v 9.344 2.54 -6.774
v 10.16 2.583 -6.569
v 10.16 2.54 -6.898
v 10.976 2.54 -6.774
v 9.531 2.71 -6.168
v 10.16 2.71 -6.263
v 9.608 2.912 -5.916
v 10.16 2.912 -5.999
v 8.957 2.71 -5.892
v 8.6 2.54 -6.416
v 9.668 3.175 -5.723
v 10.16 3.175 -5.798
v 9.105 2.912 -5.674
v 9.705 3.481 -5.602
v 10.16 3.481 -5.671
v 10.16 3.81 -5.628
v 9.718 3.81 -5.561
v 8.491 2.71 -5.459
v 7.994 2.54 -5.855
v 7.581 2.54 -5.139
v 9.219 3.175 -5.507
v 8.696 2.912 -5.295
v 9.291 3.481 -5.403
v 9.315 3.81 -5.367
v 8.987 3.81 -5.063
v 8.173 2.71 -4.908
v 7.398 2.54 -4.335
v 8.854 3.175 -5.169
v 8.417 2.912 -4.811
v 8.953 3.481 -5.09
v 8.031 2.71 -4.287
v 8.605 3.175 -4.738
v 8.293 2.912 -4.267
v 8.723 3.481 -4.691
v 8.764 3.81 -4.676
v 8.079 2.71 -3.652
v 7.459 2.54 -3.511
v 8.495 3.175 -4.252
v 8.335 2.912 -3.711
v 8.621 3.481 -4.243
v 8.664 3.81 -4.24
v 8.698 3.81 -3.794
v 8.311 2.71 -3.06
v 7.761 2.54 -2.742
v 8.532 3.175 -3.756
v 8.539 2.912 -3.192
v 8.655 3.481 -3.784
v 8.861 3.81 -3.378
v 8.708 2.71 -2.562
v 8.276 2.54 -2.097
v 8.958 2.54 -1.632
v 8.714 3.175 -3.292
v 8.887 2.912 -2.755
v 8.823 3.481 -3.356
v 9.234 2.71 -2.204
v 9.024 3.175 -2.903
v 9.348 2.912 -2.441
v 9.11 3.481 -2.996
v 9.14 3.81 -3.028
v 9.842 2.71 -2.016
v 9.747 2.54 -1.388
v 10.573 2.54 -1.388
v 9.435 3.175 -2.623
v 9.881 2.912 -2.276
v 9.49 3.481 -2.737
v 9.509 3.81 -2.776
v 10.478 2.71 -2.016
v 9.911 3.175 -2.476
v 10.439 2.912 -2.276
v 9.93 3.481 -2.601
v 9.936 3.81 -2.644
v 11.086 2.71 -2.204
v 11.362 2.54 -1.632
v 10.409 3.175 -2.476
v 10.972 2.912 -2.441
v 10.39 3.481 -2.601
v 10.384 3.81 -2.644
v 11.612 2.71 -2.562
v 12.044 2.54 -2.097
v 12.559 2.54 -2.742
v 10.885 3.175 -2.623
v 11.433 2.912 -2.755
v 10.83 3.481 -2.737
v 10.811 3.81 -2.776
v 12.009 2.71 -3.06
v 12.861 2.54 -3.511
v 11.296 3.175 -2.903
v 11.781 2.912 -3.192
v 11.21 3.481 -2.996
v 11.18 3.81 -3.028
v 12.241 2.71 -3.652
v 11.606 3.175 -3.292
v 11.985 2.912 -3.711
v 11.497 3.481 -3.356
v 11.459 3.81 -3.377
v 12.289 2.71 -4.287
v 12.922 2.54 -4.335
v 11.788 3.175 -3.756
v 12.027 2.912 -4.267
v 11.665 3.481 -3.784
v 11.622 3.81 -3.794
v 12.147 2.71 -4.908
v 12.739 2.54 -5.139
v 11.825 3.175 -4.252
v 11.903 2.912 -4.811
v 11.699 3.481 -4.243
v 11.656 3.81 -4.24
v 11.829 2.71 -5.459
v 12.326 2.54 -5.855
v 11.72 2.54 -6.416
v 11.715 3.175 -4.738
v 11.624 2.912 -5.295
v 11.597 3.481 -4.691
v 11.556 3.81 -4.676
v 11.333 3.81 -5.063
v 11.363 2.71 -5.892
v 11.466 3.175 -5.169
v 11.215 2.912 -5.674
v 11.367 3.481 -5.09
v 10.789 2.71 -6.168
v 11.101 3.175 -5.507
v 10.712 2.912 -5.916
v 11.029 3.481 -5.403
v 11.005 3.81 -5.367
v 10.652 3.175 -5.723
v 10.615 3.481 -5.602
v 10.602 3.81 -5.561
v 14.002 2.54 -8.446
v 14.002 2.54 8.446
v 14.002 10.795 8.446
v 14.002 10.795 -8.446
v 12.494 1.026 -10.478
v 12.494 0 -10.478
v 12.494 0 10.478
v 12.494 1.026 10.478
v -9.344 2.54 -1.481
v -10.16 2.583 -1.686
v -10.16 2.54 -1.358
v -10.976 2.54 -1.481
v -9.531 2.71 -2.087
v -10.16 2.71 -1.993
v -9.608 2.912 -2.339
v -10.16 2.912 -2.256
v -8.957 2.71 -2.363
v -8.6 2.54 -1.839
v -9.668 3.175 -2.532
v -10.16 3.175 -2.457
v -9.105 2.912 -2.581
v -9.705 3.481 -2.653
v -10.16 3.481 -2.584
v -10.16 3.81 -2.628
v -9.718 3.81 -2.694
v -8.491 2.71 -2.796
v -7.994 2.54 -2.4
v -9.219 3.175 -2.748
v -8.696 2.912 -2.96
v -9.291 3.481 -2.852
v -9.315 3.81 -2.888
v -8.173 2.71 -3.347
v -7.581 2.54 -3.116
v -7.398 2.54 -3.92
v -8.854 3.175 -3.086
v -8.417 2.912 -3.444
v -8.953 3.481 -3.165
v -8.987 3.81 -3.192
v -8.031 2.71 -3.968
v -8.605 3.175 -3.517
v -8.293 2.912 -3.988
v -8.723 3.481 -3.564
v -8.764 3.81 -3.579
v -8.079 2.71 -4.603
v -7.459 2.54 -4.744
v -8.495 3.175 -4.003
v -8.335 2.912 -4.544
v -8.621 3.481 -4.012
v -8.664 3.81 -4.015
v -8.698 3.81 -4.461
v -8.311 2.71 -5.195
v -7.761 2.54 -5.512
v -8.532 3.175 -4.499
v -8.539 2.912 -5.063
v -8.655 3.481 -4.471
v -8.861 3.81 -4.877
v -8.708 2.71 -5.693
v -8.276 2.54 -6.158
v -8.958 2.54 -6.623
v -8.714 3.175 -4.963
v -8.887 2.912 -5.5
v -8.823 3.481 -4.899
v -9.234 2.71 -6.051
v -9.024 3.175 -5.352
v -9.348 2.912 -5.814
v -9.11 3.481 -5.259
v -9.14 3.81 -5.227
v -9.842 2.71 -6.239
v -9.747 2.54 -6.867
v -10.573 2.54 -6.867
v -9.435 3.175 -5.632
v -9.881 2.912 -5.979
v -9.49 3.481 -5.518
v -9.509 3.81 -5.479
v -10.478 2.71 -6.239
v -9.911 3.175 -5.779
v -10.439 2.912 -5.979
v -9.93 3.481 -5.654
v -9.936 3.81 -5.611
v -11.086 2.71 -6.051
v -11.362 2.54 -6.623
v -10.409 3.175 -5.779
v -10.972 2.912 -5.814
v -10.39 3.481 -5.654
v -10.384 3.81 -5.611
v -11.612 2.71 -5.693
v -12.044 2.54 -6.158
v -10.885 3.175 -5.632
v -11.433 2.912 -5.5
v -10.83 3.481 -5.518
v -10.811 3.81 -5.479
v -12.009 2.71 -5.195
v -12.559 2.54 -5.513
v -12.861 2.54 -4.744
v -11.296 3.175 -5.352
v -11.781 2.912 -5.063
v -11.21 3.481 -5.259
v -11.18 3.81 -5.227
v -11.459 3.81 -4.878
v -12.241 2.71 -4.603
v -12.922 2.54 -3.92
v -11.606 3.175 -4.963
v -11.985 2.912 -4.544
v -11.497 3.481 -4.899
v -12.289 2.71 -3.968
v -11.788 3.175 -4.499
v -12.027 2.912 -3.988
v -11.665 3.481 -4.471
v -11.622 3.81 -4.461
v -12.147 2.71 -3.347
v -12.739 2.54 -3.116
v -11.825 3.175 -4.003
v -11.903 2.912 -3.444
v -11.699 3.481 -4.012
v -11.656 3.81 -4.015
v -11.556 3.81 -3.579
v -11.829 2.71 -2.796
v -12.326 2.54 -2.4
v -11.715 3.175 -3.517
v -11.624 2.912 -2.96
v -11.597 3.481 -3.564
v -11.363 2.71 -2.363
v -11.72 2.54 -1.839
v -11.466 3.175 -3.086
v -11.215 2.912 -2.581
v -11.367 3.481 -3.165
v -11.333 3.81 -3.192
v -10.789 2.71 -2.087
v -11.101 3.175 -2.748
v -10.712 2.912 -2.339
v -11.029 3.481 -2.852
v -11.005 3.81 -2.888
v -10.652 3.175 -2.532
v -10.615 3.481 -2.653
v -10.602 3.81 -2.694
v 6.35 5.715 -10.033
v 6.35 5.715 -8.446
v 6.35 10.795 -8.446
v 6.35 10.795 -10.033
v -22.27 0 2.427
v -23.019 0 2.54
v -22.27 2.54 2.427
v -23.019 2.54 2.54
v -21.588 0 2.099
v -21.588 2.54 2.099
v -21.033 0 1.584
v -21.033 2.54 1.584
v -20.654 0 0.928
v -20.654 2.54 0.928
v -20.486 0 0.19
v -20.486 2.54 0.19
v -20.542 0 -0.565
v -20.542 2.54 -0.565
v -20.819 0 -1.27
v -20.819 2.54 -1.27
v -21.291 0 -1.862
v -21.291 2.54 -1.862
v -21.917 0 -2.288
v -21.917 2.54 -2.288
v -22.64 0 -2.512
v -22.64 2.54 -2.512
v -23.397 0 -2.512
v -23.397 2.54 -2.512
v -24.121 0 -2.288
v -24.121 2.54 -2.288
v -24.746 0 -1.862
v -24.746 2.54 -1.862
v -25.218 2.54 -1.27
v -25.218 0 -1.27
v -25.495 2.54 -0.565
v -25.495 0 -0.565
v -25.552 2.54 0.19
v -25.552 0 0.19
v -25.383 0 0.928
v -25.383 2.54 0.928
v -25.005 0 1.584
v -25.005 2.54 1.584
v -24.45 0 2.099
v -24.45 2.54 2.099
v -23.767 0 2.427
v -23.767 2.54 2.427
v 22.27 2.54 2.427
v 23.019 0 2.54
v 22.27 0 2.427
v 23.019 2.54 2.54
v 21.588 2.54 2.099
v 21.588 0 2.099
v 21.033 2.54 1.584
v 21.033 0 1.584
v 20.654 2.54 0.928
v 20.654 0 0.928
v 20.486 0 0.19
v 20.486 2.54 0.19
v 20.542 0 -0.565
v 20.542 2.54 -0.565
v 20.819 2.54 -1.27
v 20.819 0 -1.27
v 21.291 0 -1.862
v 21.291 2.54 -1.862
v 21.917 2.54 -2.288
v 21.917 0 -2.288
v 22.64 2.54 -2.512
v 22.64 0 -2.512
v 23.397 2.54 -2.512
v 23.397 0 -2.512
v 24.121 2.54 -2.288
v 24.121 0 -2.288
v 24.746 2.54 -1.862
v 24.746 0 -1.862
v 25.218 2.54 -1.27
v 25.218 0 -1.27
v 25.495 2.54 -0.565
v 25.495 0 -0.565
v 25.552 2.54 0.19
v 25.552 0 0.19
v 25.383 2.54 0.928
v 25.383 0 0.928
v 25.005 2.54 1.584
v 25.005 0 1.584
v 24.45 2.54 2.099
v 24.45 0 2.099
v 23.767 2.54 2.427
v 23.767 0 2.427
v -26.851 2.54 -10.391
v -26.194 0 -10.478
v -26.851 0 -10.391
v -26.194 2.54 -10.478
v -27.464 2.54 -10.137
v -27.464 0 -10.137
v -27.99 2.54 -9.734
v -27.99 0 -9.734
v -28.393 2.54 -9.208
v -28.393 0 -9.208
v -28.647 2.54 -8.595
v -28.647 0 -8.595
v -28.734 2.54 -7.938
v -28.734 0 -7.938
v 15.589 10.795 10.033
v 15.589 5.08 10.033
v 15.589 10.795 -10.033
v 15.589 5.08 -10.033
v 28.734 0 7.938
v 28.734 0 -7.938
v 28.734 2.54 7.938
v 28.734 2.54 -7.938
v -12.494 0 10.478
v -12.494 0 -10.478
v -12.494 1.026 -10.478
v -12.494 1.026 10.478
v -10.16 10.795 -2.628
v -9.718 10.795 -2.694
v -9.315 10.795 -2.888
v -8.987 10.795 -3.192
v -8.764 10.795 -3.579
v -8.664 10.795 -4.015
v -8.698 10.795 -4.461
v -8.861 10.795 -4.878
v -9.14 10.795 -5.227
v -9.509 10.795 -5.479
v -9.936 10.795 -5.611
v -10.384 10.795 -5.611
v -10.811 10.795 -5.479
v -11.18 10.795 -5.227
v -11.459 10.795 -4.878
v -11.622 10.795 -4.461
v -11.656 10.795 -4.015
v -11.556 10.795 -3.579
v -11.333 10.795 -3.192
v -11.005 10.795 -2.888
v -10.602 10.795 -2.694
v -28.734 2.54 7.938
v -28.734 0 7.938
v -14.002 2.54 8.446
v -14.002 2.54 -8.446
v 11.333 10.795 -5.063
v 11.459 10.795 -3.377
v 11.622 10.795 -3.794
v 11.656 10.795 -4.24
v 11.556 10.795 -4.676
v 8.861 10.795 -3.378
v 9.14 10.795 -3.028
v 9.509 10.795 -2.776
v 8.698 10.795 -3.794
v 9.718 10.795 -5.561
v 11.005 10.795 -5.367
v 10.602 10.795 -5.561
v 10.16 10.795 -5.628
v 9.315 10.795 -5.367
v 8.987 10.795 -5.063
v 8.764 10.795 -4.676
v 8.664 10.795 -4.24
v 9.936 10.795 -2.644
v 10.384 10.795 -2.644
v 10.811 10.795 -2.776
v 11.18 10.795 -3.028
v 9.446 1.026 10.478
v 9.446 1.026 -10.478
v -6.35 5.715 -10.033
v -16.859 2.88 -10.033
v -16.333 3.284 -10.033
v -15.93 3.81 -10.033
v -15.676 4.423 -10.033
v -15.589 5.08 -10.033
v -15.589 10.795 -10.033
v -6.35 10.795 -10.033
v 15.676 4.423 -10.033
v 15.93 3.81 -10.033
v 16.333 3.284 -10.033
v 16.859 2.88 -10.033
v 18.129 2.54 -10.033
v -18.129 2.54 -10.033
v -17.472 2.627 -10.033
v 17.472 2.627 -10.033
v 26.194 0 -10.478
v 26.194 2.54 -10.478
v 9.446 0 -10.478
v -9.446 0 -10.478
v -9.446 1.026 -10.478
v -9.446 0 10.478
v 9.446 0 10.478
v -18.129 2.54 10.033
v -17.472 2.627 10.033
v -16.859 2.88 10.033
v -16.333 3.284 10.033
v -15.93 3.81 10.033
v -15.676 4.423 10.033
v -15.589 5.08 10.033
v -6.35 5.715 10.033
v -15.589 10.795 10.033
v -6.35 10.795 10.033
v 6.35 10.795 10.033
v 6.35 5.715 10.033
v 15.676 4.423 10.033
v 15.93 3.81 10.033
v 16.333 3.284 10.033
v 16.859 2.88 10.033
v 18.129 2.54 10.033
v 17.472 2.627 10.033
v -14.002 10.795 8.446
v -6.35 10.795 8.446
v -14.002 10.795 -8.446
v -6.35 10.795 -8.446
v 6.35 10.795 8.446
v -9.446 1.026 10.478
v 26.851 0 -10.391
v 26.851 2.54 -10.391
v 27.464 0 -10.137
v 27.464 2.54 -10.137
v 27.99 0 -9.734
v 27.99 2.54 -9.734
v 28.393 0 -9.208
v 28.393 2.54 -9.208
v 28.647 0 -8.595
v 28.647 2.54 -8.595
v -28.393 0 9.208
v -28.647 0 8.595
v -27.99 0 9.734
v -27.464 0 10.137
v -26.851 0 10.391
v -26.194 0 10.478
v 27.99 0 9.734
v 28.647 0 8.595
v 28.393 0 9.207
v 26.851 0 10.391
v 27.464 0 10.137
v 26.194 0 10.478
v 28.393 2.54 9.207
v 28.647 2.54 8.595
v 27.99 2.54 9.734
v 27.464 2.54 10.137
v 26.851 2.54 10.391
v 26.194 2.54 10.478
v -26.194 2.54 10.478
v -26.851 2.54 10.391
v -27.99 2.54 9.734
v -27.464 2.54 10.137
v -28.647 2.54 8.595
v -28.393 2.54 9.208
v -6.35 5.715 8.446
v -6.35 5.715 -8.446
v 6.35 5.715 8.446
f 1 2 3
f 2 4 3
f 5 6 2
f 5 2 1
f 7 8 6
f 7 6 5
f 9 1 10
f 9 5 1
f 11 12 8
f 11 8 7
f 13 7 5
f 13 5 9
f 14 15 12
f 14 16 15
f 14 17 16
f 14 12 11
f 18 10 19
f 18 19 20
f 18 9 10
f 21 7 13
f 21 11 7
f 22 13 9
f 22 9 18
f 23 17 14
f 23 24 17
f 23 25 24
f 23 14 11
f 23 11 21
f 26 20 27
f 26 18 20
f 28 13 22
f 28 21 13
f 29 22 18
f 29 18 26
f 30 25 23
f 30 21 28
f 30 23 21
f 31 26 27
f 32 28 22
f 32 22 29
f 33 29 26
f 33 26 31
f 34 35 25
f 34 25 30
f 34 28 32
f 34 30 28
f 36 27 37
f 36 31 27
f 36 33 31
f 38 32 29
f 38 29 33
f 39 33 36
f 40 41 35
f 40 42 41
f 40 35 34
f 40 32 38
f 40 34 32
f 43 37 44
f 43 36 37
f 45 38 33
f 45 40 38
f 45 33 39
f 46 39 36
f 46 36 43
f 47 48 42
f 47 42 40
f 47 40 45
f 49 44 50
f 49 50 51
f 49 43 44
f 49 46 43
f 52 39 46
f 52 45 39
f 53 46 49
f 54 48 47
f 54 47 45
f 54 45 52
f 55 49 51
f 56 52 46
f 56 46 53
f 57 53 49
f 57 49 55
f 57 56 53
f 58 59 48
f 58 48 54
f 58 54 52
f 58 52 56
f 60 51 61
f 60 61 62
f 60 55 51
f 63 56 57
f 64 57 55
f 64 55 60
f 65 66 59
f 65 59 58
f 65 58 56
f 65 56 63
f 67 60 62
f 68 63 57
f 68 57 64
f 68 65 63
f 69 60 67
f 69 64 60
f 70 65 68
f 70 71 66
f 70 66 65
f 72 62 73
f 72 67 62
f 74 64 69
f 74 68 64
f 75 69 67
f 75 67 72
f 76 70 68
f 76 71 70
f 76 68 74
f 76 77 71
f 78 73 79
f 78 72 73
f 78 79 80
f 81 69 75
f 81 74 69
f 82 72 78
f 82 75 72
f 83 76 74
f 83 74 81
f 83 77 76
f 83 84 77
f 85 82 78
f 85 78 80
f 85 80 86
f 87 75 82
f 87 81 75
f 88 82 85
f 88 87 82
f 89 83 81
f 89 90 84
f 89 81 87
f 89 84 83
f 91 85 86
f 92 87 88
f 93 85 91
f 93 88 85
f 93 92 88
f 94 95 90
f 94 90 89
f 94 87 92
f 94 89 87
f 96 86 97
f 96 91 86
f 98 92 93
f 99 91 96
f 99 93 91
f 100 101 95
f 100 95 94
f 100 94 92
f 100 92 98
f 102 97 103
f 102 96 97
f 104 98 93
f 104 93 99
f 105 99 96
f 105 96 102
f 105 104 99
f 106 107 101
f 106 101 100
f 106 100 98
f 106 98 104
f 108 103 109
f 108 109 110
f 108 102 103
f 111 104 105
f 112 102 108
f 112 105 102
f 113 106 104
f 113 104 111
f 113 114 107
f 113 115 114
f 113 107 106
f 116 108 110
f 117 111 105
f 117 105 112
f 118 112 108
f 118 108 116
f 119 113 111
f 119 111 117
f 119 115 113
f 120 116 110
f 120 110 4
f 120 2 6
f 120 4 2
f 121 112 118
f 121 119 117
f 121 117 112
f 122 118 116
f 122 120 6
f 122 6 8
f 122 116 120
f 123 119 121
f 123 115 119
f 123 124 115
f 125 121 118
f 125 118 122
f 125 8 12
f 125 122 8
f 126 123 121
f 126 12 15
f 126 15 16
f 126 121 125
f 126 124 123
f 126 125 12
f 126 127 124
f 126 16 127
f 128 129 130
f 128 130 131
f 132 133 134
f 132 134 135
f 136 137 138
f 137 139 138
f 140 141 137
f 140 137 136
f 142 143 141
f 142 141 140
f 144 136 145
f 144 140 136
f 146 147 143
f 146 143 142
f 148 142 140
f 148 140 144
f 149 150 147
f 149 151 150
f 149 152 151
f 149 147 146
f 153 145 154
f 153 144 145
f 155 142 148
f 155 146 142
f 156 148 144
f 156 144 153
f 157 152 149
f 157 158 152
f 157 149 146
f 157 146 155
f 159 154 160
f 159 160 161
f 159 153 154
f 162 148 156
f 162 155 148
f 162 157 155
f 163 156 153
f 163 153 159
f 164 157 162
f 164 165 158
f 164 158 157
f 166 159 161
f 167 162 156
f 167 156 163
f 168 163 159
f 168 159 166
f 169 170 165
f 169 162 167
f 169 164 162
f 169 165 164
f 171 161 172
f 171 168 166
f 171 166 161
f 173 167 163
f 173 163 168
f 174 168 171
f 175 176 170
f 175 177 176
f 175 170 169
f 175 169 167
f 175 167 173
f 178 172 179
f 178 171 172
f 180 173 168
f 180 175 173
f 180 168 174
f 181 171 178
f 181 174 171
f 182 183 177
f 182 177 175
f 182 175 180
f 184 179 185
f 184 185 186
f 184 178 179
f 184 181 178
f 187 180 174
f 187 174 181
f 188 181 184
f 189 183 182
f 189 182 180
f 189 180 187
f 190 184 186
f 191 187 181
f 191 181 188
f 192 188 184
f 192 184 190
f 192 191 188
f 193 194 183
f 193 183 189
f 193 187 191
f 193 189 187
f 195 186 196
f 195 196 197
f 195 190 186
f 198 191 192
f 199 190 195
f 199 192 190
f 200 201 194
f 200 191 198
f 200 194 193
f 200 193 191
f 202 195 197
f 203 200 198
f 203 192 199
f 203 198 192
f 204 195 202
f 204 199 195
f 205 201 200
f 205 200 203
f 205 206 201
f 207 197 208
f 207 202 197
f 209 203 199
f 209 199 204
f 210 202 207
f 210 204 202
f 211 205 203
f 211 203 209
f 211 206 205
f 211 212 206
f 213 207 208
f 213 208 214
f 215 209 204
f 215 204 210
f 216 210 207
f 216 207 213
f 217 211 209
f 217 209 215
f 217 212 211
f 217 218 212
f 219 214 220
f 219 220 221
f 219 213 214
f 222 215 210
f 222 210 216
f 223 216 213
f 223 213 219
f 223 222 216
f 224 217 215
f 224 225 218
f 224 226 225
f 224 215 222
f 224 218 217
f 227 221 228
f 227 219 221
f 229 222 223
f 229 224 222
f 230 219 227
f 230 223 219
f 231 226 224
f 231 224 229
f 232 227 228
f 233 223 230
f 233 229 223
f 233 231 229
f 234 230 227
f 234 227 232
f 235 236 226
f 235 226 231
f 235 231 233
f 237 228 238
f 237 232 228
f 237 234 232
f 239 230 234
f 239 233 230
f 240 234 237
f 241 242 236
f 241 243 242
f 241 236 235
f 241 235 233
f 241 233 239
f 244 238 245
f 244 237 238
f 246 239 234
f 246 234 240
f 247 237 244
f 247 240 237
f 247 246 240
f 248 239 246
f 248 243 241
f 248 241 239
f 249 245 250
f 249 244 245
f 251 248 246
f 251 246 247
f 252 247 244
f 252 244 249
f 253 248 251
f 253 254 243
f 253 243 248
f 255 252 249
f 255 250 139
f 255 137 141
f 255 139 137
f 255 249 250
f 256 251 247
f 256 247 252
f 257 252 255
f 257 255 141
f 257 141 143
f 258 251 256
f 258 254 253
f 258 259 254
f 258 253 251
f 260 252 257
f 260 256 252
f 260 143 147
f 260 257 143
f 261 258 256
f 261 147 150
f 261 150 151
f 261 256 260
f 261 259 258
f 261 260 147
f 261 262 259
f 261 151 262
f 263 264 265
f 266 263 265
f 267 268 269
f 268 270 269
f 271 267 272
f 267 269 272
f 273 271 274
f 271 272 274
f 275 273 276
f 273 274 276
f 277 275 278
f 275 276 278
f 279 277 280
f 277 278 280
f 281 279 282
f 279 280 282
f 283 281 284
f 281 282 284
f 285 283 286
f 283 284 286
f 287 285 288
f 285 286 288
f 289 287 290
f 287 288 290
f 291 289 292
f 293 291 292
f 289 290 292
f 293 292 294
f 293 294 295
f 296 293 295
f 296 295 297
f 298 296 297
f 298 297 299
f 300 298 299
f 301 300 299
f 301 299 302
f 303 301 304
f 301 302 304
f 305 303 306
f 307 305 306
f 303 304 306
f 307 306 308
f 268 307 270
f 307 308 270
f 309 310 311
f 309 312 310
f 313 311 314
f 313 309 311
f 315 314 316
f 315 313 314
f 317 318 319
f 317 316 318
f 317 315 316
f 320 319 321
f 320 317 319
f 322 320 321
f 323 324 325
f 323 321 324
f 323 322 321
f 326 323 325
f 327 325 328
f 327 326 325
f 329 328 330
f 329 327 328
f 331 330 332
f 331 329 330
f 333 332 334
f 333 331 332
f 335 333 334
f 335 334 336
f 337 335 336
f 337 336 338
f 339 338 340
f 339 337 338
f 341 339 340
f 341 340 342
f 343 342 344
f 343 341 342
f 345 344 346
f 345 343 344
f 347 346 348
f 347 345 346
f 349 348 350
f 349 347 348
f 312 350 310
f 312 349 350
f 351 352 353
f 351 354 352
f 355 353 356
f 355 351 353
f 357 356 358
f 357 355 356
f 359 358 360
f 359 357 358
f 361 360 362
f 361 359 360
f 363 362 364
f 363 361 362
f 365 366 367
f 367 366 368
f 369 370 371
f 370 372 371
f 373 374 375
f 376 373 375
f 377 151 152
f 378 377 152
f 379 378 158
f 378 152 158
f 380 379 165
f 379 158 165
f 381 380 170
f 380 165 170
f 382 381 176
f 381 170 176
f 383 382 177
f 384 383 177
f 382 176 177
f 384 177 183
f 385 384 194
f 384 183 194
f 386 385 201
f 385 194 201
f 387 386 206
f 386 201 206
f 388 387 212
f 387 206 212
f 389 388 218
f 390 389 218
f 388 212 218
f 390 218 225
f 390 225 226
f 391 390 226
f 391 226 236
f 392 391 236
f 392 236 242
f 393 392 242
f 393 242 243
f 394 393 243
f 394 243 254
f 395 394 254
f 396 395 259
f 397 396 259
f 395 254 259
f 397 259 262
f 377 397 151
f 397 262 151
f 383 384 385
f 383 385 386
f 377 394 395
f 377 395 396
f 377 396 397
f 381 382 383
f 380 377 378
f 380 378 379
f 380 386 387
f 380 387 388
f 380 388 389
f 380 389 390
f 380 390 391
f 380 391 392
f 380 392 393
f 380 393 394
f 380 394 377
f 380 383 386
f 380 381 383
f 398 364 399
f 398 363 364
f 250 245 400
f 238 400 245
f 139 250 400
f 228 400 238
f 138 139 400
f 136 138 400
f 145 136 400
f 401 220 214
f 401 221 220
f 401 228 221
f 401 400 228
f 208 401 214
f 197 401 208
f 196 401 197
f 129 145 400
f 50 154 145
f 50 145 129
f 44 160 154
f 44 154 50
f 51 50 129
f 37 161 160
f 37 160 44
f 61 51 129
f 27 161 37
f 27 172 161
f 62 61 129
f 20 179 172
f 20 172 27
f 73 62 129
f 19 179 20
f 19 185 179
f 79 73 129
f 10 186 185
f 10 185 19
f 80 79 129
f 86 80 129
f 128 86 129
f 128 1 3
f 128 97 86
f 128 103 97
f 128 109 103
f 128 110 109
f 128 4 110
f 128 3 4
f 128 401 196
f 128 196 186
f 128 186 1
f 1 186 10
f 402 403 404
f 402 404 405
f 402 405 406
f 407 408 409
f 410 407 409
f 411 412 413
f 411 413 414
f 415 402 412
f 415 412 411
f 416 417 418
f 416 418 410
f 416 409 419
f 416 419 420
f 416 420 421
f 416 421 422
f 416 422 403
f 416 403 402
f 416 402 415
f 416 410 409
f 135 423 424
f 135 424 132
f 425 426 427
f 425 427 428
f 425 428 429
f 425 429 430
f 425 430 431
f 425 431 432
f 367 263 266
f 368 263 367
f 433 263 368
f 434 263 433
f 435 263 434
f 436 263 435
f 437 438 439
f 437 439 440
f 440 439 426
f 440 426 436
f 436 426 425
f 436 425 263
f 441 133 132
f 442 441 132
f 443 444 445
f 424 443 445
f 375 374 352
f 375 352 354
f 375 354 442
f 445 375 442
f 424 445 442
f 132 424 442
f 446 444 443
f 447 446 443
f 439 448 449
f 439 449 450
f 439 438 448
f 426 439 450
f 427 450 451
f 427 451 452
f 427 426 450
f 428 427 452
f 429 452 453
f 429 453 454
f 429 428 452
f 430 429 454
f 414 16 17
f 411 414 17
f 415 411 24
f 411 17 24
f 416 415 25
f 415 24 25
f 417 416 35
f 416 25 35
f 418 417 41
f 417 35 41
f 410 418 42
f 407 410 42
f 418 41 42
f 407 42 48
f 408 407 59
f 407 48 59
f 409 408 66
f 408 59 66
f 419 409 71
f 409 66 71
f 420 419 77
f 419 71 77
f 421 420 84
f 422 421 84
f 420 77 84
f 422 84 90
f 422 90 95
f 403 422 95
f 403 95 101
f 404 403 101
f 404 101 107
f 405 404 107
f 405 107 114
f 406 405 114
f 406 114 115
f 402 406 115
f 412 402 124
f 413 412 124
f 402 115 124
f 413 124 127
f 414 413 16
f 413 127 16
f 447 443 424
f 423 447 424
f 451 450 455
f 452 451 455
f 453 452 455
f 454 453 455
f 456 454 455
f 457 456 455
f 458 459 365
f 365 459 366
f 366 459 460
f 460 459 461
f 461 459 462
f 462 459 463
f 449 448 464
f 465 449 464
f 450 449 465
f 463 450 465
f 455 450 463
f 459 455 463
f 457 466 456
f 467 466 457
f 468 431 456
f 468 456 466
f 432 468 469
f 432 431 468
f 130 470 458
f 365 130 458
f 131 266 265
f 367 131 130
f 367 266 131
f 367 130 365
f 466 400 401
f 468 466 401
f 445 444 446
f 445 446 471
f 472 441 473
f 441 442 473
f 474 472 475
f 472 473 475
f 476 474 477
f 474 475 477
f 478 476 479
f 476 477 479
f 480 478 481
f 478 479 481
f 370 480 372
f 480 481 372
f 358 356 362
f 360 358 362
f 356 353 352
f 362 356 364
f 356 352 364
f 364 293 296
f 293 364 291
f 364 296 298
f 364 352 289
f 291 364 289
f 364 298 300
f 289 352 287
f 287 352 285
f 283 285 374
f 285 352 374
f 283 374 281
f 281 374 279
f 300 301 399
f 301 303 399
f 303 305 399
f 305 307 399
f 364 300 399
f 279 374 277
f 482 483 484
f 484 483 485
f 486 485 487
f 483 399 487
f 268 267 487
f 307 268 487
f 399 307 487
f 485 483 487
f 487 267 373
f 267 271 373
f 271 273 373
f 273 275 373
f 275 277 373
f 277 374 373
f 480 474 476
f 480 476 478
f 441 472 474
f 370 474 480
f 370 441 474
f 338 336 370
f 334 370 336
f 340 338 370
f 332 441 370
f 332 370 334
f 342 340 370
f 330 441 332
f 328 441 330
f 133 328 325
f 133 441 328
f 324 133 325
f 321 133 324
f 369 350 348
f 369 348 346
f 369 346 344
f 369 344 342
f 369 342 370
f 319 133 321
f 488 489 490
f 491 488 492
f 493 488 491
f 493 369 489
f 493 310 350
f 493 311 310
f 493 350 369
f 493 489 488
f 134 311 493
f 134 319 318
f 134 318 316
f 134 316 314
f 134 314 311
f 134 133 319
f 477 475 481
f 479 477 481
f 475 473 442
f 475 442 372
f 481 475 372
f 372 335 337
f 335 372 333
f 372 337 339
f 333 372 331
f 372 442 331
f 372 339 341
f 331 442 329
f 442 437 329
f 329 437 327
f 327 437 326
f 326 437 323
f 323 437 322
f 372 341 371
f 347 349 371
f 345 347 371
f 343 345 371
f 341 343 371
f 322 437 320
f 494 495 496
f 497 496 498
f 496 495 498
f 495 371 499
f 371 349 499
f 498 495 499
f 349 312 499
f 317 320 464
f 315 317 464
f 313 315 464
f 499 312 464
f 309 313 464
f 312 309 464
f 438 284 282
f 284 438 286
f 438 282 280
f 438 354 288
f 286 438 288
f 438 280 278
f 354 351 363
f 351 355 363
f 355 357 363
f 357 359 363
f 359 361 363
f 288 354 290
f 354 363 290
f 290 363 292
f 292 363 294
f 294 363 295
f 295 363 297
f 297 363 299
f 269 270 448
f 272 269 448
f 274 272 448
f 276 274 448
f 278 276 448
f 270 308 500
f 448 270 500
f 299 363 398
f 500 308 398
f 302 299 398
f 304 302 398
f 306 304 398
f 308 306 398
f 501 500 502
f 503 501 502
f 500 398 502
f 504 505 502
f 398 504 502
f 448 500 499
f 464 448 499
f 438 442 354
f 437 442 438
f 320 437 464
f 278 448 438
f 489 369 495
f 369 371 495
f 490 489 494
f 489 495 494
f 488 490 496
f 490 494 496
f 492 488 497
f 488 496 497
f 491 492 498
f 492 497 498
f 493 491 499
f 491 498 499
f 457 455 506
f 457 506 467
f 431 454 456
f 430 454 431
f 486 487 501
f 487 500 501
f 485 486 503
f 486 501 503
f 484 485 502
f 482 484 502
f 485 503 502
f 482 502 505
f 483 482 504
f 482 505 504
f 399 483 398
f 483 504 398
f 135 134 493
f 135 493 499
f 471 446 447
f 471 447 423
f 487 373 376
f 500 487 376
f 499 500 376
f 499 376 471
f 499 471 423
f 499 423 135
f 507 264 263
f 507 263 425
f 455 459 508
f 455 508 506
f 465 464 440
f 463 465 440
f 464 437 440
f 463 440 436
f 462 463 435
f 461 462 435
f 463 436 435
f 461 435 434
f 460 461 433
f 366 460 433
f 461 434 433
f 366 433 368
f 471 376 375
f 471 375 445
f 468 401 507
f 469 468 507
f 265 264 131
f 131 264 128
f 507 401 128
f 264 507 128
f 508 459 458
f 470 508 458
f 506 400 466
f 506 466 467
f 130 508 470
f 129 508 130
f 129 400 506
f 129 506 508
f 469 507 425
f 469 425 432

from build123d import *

# Parameters (mm, degrees)
SKETCH1_W               = 32.0675
SKETCH1_H               = 20.955
BOSS_EXTRUDE2_DEPTH     = 2.54
SKETCH3_W               = 31.1785
SKETCH3_H               = 20.066
SKETCH3_W_2             = 28.0035
SKETCH3_H_2             = 16.891
EXTRUDE_THIN1_DEPTH     = 8.255
CUT_EXTRUDE1_DEPTH      = 29.508335431
CUT_EXTRUDE1_DEPTH_BACK = 29.508335431
SKETCH4_W               = 12.7
SKETCH4_H               = 5.08
SKETCH5_R               = 1.5
BOSS_EXTRUDE3_DEPTH     = 8.255
FILLET1_R               = 1.27
CUT_EXTRUDE2_DEPTH      = 29.508335431
CUT_EXTRUDE2_DEPTH_BACK = 29.508335431
SKETCH6_W               = 3.048
SKETCH6_H               = 1.02616
SKETCH7_W               = 20.955
SKETCH7_H               = 2.54
BOSS_EXTRUDE4_DEPTH     = 12.7
FILLET2_R               = 2.54
FILLET3_R               = 2.54
SKETCH8_R               = 2.54
CUT_EXTRUDE3_DEPTH      = 32.67887972
FILLET4_R               = 2.54


with BuildPart() as part:
    # Sketch1 → Boss-Extrude2 (new body)
    with BuildSketch(Plane(origin=(0, 0, 0), x_dir=(1, 0, 0), z_dir=(0, 1, 0))):
        Rectangle(SKETCH1_W, SKETCH1_H)
    extrude(amount=BOSS_EXTRUDE2_DEPTH)

    # Sketch3 → Extrude-Thin1 (add)
    with BuildSketch(Plane(origin=(0, 2.54, 0), x_dir=(1, 0, 0), z_dir=(0, 1, 0))):
        Rectangle(SKETCH3_W, SKETCH3_H)
        Rectangle(SKETCH3_W_2, SKETCH3_H_2, mode=Mode.SUBTRACT)
    extrude(amount=EXTRUDE_THIN1_DEPTH)

    # Sketch4 → Cut-Extrude1 (cut, two sides: drawn at the far end of the back side and taken through both)
    with BuildSketch(Plane(origin=(0, 0, -10.4775), x_dir=(-1, 0, 0), z_dir=(0, 0, -1)).offset(-CUT_EXTRUDE1_DEPTH_BACK)):
        with Locations((0, 8.255)):
            Rectangle(SKETCH4_W, SKETCH4_H)
    extrude(amount=CUT_EXTRUDE1_DEPTH + CUT_EXTRUDE1_DEPTH_BACK, mode=Mode.SUBTRACT)

    # Sketch5 → Boss-Extrude3 (add)
    with BuildSketch(Plane(origin=(0, 2.54, 0), x_dir=(1, 0, 0), z_dir=(0, 1, 0))):
        with Locations(Location((-10.16, 4.1275, 0), (0, 0, 270))):
            Circle(SKETCH5_R)
        with Locations(Location((10.16, 4.1275, 0), (0, 0, 90))):
            Circle(SKETCH5_R)
    extrude(amount=BOSS_EXTRUDE3_DEPTH)

    # Fillet1
    fillet1_edges = [part.edges().sort_by_distance(p)[0] for p in [
        (-10.16, 2.54, -5.6275),
        (10.16, 2.54, -2.6275),
    ]]
    fillet(fillet1_edges, radius=FILLET1_R)

    # Sketch6 → Cut-Extrude2 (cut, two sides: drawn at the far end of the back side and taken through both)
    with BuildSketch(Plane.XY.offset(10.4775).offset(-CUT_EXTRUDE2_DEPTH_BACK)):
        with Locations((-10.969625, 0.51308)):
            Rectangle(SKETCH6_W, SKETCH6_H)
        with Locations((10.969625, 0.51308)):
            Rectangle(SKETCH6_W, SKETCH6_H)
    extrude(amount=CUT_EXTRUDE2_DEPTH + CUT_EXTRUDE2_DEPTH_BACK, mode=Mode.SUBTRACT)

    # Sketch7 → Boss-Extrude4 (add)
    with BuildSketch(Plane.ZY.offset(16.03375)):
        with Locations((0, 1.27)):
            Rectangle(SKETCH7_W, SKETCH7_H)
    boss_extrude4 = extrude(amount=BOSS_EXTRUDE4_DEPTH)

    # Fillet2
    fillet2_edges = [part.edges().sort_by_distance(p)[0] for p in [
        (-28.73375, 1.27, -10.4775),
        (-28.73375, 1.27, 10.4775),
    ]]
    fillet(fillet2_edges, radius=FILLET2_R)

    # Fillet3
    fillet3_edges = [part.edges().sort_by_distance(p)[0] for p in [
        (-15.58925, 2.54, 0),
    ]]
    fillet(fillet3_edges, radius=FILLET3_R)

    # Sketch8 → Cut-Extrude3 (cut, symmetric)
    with BuildSketch(Plane(origin=(0, 2.54, 0), x_dir=(1, 0, 0), z_dir=(0, 1, 0))):
        with Locations(Location((-23.01875, 0, 0), (0, 0, 270))):
            Circle(SKETCH8_R)
    cut_extrude3 = extrude(amount=CUT_EXTRUDE3_DEPTH, both=True, mode=Mode.SUBTRACT)

    # Mirror2: Boss-Extrude4 across plane
    add(boss_extrude4.mirror(Plane(origin=(0, 0, 0), x_dir=(0, 0, 1), z_dir=(1, 0, 0))))

    # Mirror6: Cut-Extrude3 across plane
    add(cut_extrude3.mirror(Plane(origin=(0, 0, 0), x_dir=(0, 0, 1), z_dir=(1, 0, 0))), mode=Mode.SUBTRACT)

    # Fillet4
    fillet4_edges = [part.edges().sort_by_distance(p)[0] for p in [
        (28.73375, 1.27, -10.4775),
        (28.73375, 1.27, 10.4775),
        (15.58925, 2.54, 0),
    ]]
    fillet(fillet4_edges, radius=FILLET4_R)


solid = part.part
